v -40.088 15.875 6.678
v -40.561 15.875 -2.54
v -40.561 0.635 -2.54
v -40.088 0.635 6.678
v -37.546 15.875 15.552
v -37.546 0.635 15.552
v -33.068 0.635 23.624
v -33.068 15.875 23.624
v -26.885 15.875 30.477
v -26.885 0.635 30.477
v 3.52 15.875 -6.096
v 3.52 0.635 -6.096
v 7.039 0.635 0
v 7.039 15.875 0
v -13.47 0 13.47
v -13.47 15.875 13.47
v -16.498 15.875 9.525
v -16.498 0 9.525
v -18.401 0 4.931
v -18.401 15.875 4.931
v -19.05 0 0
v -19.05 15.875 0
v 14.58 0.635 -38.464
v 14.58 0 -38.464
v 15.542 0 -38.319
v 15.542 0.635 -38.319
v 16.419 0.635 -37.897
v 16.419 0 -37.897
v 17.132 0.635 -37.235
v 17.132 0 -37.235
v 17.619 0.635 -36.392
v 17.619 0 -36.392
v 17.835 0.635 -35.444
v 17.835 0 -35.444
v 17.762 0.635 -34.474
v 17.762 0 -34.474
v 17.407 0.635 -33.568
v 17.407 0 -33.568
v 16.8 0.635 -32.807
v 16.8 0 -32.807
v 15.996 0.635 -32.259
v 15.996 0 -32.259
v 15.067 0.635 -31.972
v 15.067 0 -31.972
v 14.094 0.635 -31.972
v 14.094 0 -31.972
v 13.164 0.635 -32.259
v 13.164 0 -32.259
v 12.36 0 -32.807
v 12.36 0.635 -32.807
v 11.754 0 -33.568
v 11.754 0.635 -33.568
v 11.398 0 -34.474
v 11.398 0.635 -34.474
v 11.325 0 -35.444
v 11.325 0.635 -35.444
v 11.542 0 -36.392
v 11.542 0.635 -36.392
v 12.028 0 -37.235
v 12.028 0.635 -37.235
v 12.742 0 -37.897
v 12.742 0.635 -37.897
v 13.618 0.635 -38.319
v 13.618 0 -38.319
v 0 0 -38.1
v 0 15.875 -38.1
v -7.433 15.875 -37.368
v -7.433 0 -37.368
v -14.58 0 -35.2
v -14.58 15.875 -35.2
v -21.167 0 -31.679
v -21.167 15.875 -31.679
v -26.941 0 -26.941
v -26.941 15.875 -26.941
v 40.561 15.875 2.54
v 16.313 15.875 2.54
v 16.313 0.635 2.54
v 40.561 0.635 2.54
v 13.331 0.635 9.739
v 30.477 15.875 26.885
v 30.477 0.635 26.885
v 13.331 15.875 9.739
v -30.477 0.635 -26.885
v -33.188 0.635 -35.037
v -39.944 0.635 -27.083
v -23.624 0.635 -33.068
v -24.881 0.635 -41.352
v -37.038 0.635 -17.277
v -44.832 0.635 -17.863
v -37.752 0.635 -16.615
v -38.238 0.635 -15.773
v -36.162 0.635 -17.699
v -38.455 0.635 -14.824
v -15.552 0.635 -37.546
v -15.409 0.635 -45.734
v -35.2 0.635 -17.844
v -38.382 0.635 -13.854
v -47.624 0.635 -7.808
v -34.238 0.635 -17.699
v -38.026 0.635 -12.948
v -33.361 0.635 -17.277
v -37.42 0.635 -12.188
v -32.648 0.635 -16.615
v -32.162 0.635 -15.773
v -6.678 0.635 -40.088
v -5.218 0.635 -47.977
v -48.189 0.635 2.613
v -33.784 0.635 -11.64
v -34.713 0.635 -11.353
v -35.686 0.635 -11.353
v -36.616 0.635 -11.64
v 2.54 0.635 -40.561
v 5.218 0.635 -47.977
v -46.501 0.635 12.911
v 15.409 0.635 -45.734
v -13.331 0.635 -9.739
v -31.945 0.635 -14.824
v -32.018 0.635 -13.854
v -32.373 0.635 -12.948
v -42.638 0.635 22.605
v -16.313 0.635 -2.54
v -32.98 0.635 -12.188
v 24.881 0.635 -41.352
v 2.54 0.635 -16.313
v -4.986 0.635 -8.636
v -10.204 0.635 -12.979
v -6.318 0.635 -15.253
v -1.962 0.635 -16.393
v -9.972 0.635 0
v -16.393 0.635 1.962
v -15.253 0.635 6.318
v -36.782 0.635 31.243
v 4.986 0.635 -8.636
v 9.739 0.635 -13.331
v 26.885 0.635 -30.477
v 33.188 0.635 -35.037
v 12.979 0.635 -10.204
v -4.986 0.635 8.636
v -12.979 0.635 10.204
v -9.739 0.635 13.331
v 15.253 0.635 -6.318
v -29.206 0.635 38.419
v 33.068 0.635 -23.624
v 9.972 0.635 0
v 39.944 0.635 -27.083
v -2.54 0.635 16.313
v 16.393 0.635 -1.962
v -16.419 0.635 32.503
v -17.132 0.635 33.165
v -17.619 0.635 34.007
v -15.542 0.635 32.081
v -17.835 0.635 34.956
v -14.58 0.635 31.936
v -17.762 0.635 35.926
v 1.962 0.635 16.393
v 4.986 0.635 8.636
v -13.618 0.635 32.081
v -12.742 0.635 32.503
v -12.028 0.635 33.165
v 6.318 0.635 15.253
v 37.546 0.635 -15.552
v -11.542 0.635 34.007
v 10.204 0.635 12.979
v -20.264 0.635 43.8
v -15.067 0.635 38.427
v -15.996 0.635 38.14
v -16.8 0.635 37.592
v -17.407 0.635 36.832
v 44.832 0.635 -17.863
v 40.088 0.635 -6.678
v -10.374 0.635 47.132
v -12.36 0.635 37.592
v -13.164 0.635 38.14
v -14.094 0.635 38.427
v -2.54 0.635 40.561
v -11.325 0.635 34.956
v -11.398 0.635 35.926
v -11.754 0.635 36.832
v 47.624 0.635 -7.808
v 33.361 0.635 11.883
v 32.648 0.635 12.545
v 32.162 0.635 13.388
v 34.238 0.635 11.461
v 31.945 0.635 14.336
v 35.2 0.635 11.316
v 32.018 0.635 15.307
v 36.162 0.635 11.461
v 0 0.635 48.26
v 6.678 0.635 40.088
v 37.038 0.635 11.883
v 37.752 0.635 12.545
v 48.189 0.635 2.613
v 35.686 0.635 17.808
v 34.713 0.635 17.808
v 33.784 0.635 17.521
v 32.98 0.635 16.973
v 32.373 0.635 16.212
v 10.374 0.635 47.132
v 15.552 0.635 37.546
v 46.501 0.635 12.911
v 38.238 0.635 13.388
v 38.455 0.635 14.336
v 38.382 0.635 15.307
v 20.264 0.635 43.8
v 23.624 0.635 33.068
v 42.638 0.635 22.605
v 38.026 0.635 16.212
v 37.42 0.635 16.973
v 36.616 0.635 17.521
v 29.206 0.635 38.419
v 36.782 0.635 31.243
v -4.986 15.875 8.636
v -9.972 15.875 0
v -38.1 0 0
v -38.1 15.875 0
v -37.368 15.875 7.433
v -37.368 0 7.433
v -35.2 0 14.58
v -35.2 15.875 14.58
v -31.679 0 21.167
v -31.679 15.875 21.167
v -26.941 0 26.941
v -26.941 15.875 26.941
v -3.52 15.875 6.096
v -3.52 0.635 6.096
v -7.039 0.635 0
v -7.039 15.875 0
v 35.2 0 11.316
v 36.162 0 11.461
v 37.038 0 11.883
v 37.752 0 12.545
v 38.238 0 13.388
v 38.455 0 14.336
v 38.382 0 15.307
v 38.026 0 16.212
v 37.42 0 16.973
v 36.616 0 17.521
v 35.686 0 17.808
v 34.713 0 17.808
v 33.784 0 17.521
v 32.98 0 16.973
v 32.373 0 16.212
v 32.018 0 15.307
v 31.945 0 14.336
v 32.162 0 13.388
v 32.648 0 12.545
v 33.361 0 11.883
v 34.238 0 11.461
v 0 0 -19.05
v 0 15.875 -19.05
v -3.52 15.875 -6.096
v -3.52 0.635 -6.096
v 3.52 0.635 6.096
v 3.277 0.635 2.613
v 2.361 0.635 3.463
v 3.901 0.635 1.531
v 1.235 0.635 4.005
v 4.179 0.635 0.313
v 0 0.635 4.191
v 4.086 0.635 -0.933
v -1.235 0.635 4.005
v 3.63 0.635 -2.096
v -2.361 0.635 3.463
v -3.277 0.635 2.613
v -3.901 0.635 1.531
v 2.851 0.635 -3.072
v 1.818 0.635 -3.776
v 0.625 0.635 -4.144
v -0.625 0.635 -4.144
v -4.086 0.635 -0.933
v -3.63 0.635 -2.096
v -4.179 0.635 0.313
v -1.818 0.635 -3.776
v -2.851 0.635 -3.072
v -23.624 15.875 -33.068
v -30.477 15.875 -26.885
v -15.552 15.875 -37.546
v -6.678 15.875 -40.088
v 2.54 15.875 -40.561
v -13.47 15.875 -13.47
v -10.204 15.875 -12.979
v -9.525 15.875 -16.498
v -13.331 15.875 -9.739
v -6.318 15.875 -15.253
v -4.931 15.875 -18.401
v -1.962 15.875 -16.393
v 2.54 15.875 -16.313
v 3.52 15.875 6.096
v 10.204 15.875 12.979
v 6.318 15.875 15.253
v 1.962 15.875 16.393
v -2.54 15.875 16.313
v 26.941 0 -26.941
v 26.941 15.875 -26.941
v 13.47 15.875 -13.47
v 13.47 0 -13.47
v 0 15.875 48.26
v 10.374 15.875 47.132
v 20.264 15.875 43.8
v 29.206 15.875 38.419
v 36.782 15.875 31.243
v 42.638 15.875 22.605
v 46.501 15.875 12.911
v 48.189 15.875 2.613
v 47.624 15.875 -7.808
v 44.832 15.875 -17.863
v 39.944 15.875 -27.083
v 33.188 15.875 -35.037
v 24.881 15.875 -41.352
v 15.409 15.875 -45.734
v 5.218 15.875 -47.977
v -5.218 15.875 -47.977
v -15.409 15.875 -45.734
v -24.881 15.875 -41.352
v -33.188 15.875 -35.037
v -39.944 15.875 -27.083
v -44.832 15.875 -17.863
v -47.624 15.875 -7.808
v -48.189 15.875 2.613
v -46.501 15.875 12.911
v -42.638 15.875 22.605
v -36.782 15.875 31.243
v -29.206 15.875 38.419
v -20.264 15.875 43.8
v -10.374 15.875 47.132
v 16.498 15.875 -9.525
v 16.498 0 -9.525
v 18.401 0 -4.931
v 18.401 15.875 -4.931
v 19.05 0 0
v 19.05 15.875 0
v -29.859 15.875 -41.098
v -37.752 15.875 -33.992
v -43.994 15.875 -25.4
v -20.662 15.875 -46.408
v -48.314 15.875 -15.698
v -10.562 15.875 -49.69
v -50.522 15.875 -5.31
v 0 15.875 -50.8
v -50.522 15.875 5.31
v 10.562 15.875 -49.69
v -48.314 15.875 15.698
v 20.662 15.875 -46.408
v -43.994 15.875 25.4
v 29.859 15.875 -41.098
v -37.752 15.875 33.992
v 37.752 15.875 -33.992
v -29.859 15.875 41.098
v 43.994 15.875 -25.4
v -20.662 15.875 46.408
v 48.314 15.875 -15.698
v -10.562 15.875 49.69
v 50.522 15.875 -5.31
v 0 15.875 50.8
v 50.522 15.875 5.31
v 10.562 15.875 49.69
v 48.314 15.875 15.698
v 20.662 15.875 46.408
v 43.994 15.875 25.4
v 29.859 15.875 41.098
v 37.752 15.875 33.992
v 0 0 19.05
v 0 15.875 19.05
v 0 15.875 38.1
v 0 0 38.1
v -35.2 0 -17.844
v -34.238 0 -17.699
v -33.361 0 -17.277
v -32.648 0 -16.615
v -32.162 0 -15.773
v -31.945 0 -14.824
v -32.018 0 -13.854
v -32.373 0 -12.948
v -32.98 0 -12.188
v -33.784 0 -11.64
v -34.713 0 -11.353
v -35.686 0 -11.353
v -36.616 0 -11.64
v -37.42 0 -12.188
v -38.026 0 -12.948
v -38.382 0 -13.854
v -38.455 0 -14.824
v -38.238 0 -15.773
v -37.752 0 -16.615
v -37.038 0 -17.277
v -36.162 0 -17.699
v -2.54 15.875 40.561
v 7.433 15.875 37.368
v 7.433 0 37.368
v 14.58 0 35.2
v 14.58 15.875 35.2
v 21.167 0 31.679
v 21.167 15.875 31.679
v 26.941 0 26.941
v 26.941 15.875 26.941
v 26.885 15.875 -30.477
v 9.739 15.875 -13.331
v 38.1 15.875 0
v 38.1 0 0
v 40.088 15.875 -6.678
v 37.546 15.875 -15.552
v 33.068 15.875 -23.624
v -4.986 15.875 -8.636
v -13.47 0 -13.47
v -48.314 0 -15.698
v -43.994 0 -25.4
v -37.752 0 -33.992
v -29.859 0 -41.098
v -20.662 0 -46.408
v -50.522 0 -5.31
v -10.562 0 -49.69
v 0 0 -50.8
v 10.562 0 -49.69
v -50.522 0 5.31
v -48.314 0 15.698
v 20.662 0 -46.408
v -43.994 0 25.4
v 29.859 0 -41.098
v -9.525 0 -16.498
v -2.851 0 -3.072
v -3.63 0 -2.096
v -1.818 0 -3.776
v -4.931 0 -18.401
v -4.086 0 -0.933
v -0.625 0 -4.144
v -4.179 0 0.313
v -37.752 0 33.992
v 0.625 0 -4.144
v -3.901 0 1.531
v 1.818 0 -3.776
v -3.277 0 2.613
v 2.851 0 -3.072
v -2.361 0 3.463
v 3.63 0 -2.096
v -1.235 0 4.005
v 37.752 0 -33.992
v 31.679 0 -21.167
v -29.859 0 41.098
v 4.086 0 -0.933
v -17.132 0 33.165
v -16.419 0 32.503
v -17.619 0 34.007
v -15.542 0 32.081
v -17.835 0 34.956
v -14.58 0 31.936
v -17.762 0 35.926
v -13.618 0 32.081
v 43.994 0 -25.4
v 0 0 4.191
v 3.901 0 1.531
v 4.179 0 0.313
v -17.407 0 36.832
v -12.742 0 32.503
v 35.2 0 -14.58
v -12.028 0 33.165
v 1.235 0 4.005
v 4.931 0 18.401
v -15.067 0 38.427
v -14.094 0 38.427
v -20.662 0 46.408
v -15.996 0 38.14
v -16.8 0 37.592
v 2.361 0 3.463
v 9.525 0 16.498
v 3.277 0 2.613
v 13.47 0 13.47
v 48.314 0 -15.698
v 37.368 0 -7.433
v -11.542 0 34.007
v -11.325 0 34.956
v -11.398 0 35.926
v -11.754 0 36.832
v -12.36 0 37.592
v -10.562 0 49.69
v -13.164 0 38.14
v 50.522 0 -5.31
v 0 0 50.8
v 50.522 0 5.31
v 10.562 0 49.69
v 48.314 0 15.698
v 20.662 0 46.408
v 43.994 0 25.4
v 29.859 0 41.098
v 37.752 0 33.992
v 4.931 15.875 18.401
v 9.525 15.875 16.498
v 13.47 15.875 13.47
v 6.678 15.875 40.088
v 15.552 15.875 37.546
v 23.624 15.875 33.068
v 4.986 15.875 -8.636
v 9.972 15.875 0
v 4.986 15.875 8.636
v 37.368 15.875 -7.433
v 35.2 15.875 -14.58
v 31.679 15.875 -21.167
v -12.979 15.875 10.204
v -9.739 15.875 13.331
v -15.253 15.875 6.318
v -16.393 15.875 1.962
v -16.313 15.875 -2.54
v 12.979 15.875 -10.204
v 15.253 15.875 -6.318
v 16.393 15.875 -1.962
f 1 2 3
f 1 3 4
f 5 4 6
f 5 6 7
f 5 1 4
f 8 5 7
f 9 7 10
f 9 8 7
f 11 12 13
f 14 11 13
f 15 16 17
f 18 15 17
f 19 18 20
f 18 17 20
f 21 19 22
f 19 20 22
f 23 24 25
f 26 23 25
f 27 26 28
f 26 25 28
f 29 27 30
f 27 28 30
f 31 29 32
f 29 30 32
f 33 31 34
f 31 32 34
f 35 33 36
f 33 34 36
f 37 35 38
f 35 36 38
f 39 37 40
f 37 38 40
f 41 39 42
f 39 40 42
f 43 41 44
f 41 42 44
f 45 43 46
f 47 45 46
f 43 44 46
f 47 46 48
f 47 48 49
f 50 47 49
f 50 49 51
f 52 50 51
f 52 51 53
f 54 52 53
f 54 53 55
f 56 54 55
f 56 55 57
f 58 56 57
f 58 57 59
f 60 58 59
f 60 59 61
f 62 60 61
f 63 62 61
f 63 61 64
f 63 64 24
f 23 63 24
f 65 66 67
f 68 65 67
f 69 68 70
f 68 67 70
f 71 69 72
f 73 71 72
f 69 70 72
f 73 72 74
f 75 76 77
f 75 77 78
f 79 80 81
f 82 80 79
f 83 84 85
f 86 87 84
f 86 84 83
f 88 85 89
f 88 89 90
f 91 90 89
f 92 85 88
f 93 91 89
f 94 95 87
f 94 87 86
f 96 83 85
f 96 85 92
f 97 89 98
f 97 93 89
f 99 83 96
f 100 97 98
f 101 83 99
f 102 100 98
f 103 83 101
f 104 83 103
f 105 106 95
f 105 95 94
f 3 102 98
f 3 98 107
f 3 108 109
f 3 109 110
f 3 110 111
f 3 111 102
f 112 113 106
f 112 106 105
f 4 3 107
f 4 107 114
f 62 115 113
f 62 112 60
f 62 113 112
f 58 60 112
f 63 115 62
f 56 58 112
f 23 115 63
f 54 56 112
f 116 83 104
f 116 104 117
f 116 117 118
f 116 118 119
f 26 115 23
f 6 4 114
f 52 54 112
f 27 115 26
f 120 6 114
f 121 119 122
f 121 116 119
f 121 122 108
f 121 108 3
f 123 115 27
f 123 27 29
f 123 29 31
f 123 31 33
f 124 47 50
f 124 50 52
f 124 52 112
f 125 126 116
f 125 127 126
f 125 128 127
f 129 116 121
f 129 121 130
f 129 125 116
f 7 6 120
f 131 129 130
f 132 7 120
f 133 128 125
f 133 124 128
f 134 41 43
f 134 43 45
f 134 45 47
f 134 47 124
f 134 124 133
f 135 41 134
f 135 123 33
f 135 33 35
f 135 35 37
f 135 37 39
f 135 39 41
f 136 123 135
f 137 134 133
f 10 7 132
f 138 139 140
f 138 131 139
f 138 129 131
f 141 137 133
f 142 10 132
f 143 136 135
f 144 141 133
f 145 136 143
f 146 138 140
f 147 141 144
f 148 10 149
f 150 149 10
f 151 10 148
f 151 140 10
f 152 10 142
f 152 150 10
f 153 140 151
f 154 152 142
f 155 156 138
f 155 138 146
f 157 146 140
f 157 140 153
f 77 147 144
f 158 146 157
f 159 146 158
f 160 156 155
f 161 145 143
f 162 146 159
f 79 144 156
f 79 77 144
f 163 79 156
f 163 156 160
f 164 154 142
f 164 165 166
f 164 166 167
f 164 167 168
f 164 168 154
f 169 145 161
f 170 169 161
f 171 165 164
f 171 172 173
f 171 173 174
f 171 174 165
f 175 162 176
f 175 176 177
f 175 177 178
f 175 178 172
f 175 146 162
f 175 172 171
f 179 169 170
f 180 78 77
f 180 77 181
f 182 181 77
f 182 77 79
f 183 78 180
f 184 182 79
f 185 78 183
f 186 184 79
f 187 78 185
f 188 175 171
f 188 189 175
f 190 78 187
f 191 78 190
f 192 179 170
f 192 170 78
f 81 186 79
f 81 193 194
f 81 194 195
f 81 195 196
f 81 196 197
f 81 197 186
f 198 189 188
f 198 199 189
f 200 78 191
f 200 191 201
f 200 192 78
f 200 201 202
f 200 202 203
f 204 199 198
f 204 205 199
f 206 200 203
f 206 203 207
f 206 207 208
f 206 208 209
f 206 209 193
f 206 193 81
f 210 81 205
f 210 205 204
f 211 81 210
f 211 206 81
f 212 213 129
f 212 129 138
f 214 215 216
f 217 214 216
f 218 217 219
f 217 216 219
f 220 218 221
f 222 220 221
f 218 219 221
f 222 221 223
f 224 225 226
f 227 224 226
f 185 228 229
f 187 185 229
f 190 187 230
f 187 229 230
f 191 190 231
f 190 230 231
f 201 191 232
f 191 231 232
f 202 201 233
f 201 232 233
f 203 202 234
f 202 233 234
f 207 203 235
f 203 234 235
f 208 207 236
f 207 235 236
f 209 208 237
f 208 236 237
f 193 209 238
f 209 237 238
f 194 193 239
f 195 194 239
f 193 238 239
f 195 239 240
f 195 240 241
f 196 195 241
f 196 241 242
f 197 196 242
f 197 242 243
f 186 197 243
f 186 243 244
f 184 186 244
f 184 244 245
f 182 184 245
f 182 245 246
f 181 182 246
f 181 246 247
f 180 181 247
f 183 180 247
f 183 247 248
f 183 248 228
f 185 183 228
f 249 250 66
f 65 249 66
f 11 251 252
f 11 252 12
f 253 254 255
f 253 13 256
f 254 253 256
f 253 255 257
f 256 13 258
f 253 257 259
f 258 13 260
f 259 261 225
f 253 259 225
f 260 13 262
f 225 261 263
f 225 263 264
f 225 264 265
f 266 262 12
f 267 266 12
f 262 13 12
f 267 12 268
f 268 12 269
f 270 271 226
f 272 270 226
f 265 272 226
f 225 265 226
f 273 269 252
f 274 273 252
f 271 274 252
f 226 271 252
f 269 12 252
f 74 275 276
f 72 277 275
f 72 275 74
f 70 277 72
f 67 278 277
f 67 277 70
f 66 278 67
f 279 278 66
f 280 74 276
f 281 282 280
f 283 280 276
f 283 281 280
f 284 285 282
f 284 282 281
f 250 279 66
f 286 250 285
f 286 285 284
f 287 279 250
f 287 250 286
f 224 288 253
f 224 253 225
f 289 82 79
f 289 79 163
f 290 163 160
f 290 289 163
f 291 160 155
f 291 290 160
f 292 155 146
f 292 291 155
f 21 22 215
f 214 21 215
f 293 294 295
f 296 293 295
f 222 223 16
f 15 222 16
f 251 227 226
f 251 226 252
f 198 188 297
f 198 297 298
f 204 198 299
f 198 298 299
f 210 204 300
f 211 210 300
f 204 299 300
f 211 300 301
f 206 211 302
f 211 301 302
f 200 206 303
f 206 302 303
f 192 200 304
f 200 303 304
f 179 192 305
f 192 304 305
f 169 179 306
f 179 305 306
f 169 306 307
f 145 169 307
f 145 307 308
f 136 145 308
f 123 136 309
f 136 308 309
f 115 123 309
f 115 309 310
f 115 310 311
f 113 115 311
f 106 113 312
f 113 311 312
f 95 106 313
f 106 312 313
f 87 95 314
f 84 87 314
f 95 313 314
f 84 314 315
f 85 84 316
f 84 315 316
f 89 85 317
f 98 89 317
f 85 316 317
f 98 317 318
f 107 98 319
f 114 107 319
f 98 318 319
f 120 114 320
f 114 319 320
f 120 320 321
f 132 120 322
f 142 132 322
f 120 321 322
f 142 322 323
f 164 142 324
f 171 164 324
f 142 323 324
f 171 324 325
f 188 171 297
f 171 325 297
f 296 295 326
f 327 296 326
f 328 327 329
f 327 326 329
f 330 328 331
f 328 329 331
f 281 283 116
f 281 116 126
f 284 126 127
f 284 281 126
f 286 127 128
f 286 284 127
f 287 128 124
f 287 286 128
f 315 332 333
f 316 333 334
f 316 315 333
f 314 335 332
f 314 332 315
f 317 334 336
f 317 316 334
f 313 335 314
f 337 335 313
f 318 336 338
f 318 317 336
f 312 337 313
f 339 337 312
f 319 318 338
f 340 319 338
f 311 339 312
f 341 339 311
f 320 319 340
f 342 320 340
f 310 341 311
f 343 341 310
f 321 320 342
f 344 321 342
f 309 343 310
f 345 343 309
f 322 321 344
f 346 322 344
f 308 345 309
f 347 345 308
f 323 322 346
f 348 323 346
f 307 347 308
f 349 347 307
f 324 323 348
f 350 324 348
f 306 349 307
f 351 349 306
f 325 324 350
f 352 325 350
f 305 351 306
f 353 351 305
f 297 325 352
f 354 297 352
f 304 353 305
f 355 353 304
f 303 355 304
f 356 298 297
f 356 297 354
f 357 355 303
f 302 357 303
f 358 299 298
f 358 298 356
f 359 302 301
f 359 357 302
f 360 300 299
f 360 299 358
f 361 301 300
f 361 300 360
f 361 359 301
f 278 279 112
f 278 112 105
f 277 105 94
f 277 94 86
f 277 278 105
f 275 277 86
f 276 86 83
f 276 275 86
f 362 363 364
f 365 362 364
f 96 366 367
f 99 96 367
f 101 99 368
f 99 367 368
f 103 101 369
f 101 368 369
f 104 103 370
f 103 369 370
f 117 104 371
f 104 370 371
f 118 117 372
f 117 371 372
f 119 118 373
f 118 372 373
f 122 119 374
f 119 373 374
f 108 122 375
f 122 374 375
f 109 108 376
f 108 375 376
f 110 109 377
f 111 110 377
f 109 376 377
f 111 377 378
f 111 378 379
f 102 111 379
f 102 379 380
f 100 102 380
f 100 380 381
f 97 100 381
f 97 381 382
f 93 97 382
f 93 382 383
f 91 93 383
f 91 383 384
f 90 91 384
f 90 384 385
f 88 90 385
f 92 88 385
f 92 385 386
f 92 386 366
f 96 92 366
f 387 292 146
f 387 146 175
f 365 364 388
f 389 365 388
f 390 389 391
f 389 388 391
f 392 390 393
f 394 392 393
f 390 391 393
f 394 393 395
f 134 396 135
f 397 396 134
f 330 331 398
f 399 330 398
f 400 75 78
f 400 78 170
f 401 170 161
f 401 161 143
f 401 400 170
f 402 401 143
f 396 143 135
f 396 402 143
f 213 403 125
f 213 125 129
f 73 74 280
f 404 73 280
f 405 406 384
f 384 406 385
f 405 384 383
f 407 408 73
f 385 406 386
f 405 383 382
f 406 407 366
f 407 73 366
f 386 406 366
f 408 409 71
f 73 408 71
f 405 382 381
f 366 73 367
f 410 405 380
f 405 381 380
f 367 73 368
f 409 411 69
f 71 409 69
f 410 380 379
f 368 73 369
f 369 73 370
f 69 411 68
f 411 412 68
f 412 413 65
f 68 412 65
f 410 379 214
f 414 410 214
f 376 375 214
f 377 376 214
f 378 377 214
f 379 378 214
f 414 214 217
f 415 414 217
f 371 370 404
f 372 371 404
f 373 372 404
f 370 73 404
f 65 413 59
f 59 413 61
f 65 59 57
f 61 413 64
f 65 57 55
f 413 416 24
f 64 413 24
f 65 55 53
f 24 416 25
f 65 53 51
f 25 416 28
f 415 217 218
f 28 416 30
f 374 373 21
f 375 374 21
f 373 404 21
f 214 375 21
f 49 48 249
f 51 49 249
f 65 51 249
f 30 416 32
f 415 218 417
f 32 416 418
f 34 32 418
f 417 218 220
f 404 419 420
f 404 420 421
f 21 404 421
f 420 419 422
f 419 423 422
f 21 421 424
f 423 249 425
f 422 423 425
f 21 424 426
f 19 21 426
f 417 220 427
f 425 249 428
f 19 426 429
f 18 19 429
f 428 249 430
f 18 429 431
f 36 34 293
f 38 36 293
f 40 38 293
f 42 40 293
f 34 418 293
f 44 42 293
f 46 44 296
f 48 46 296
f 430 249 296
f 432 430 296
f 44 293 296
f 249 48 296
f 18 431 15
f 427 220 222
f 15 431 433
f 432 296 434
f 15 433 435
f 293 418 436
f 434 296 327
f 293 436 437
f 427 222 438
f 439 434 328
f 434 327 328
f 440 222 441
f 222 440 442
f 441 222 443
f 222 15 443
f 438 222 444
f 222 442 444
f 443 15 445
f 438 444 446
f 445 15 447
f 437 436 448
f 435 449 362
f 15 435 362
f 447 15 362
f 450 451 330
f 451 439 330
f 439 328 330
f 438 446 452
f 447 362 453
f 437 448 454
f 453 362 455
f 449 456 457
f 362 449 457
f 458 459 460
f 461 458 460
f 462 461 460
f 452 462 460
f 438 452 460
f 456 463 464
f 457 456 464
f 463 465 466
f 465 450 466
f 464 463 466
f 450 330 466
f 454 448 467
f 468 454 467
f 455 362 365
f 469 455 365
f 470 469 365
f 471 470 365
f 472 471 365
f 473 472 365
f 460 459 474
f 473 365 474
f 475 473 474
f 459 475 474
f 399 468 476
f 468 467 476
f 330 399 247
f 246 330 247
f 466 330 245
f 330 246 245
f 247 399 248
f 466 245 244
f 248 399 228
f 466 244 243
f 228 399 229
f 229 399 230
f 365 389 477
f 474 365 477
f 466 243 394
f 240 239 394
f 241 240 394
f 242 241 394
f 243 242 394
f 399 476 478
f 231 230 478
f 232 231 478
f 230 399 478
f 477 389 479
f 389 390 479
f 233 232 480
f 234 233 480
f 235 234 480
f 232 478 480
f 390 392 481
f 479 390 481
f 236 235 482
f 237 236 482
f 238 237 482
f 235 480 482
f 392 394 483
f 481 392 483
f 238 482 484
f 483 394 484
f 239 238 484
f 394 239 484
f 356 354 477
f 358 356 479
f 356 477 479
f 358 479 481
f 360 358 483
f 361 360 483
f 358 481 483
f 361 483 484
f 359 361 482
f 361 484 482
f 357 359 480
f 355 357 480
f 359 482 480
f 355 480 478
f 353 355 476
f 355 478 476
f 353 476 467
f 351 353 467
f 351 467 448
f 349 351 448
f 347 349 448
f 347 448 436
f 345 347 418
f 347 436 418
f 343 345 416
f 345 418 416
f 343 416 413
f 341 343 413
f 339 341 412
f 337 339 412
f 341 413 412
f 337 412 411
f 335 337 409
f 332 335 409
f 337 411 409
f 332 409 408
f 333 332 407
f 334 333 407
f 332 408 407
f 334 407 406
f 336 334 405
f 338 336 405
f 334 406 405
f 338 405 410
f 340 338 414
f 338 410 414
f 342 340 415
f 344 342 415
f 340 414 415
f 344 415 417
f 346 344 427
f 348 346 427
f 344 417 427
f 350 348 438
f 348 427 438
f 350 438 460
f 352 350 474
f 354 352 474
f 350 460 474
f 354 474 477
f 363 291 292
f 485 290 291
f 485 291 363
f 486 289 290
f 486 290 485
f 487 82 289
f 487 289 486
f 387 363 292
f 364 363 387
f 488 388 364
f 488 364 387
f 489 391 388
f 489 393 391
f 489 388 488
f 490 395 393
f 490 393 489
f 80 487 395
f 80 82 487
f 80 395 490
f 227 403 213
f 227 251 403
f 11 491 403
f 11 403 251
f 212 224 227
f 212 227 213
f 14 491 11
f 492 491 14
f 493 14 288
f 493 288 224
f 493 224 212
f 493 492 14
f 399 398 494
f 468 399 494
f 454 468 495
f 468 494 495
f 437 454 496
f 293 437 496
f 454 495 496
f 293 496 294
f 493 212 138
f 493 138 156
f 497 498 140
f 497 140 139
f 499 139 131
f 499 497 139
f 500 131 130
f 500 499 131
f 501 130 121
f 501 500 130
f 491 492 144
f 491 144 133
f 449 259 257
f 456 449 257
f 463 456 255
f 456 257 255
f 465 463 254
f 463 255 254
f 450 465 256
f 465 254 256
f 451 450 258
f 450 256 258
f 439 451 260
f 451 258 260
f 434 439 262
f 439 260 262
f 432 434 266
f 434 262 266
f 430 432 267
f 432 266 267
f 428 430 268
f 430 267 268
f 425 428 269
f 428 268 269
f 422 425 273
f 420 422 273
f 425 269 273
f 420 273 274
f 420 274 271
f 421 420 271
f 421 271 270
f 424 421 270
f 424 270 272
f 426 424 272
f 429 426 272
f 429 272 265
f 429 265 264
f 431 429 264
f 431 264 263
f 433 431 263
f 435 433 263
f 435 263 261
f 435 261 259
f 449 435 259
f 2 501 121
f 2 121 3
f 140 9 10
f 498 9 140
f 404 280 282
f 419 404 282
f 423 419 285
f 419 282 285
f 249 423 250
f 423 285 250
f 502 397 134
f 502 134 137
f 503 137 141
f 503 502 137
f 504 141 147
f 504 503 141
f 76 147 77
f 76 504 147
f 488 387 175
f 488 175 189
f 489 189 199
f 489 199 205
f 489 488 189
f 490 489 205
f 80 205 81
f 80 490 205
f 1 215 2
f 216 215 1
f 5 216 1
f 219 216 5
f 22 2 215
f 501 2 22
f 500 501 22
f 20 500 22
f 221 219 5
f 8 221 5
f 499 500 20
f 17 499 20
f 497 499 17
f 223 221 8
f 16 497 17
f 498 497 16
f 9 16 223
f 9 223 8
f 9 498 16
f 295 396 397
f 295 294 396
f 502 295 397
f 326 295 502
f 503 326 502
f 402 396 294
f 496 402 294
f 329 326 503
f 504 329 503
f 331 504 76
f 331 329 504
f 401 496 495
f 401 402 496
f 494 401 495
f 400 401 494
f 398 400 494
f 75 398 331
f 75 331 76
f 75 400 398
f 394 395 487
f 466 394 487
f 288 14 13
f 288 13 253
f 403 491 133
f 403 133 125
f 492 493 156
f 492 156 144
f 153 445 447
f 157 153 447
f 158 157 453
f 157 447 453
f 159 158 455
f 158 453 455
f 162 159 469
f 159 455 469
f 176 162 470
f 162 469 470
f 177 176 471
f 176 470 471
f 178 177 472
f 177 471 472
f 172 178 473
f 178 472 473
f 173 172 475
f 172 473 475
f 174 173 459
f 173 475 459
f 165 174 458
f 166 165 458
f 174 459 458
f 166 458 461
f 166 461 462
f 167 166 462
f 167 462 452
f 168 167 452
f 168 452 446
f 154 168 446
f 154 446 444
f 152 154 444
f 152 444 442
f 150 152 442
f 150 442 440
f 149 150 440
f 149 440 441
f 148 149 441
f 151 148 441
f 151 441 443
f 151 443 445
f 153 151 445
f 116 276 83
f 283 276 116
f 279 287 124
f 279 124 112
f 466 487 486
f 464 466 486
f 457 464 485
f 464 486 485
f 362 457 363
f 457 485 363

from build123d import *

# Parameters (mm, degrees)
SKETCH1_R           = 50.8
BOSS_EXTRUDE1_DEPTH = 15.875
CUT_EXTRUDE2_DEPTH  = 15.24
SKETCH5_R           = 4.191
CUT_EXTRUDE3_DEPTH  = 74.440708058
CUT_EXTRUDE4_DEPTH  = 74.575101937
SKETCH7_R           = 48.26
CUT_EXTRUDE5_DEPTH  = 15.24
SKETCH8_R           = 3.2639
CUT_EXTRUDE6_DEPTH  = 74.575101937


with BuildPart() as part:
    # Sketch1 → Boss-Extrude1 (new body)
    with BuildSketch(Plane(origin=(0, 0, 0), x_dir=(1, 0, 0), z_dir=(0, 1, 0))):
        with Locations(Location((0, 0, 0), (0, 0, 270))):
            Circle(SKETCH1_R)
    extrude(amount=BOSS_EXTRUDE1_DEPTH)

    # Sketch4 → Cut-Extrude2 (cut)
    with BuildSketch(Plane(origin=(0, 15.875, 0), x_dir=(1, 0, 0), z_dir=(0, 1, 0))):
        Polygon((-3.519527241, 6.096), (3.519527241, 6.096), (7.039054482, 0), (3.519527241, -6.096), (-3.519527241, -6.096), (-7.039054482, 0), align=None)
    extrude(amount=-CUT_EXTRUDE2_DEPTH, mode=Mode.SUBTRACT)

    # Sketch5 → Cut-Extrude3 (cut, through all)
    with BuildSketch(Plane(origin=(0, 0.635, 0), x_dir=(1, 0, 0), z_dir=(0, 1, 0))):
        with Locations(Location((0, 0, 0), (0, 0, 270))):
            Circle(SKETCH5_R)
    extrude(amount=-CUT_EXTRUDE3_DEPTH, mode=Mode.SUBTRACT)

    # Sketch6 → Cut-Extrude4 (cut, through all)
    with BuildSketch(Plane(origin=(0, 15.875, 0), x_dir=(1, 0, 0), z_dir=(0, 1, 0))):
        with BuildLine():
            ThreePointArc((-13.470384182, 13.470384182), (-7.290119387, 17.599905094), (0, 19.05))
            Line((0, 19.05), (0, 38.1))
            ThreePointArc((0, 38.1), (-14.580238773, 35.199810189), (-26.940768363, 26.940768363))
            Line((-26.940768363, 26.940768363), (-13.470384182, 13.470384182))
        make_face()
        with BuildLine():
            Line((26.940768363, 26.940768363), (13.470384182, 13.470384182))
            ThreePointArc((13.470384182, 13.470384182), (17.599905094, 7.290119387), (19.05, 0))
            Line((19.05, 0), (38.1, 0))
            ThreePointArc((38.1, 0), (35.199810189, 14.580238773), (26.940768363, 26.940768363))
        make_face()
        with BuildLine():
            Line((26.940768363, -26.940768363), (13.470384182, -13.470384182))
            ThreePointArc((13.470384182, -13.470384182), (7.290119387, -17.599905094), (0, -19.05))
            Line((0, -19.05), (0, -38.1))
            ThreePointArc((0, -38.1), (14.580238773, -35.199810189), (26.940768363, -26.940768363))
        make_face()
        with BuildLine():
            Line((-26.940768363, -26.940768363), (-13.470384182, -13.470384182))
            ThreePointArc((-13.470384182, -13.470384182), (-17.599905094, -7.290119387), (-19.05, 0))
            Line((-19.05, 0), (-38.1, 0))
            ThreePointArc((-38.1, 0), (-35.199810189, -14.580238773), (-26.940768363, -26.940768363))
        make_face()
    extrude(amount=-CUT_EXTRUDE4_DEPTH, mode=Mode.SUBTRACT)

    # Sketch7 → Cut-Extrude5 (cut)
    with BuildSketch(Plane(origin=(0, 15.875, 0), x_dir=(1, 0, 0), z_dir=(0, 1, 0))):
        with Locations(Location((0, 0, 0), (0, 0, 270))):
            Circle(SKETCH7_R)
        with BuildLine():
            Line((-16.313445375, 2.54), (-40.560547334, 2.54))
            ThreePointArc((-40.560547334, 2.54), (-37.546464201, -15.552254691), (-26.884586844, -30.476689292))
            Line((-26.884586844, -30.476689292), (-9.739296625, -13.331399073))
            ThreePointArc((-9.739296625, -13.331399073), (-15.253251082, -6.318103468), (-16.313445375, 2.54))
        make_face(mode=Mode.SUBTRACT)
        with BuildLine():
            Line((16.313445375, -2.54), (40.560547334, -2.54))
            ThreePointArc((40.560547334, -2.54), (37.546464201, 15.552254691), (26.884586844, 30.476689292))
            Line((26.884586844, 30.476689292), (9.739296625, 13.331399073))
            ThreePointArc((9.739296625, 13.331399073), (15.253251082, 6.318103468), (16.313445375, -2.54))
        make_face(mode=Mode.SUBTRACT)
        Polygon((4.985996925, 8.636), (-4.985996925, 8.636), (-9.971993849, 0), (-4.985996925, -8.636), (4.985996925, -8.636), (9.971993849, 0), align=None, mode=Mode.SUBTRACT)
        with BuildLine():
            ThreePointArc((2.54, 40.560547334), (-15.552254691, 37.546464201), (-30.476689292, 26.884586844))
            Line((-30.476689292, 26.884586844), (-13.331399073, 9.739296625))
            ThreePointArc((-13.331399073, 9.739296625), (-6.318103468, 15.253251082), (2.54, 16.313445375))
            Line((2.54, 16.313445375), (2.54, 40.560547334))
        make_face(mode=Mode.SUBTRACT)
        with BuildLine():
            Line((-2.54, -16.313445375), (-2.54, -40.560547334))
            ThreePointArc((-2.54, -40.560547334), (15.552254691, -37.546464201), (30.476689292, -26.884586844))
            Line((30.476689292, -26.884586844), (13.331399073, -9.739296625))
            ThreePointArc((13.331399073, -9.739296625), (6.318103468, -15.253251082), (-2.54, -16.313445375))
        make_face(mode=Mode.SUBTRACT)
    extrude(amount=-CUT_EXTRUDE5_DEPTH, mode=Mode.SUBTRACT)

    # Sketch8 → Cut-Extrude6 (cut, through all)
    with BuildSketch(Plane.XZ):
        with Locations(Location((-35.199810189, -14.580238773, 0), (0, 0, 270))):
            Circle(SKETCH8_R)
        with Locations(Location((35.199810189, 14.580238773, 0), (0, 0, 270))):
            Circle(SKETCH8_R)
        with Locations(Location((14.580238773, -35.199810189, 0), (0, 0, 270))):
            Circle(SKETCH8_R)
        with Locations(Location((-14.580238773, 35.199810189, 0), (0, 0, 270))):
            Circle(SKETCH8_R)
    extrude(amount=-CUT_EXTRUDE6_DEPTH, mode=Mode.SUBTRACT)


solid = part.part
